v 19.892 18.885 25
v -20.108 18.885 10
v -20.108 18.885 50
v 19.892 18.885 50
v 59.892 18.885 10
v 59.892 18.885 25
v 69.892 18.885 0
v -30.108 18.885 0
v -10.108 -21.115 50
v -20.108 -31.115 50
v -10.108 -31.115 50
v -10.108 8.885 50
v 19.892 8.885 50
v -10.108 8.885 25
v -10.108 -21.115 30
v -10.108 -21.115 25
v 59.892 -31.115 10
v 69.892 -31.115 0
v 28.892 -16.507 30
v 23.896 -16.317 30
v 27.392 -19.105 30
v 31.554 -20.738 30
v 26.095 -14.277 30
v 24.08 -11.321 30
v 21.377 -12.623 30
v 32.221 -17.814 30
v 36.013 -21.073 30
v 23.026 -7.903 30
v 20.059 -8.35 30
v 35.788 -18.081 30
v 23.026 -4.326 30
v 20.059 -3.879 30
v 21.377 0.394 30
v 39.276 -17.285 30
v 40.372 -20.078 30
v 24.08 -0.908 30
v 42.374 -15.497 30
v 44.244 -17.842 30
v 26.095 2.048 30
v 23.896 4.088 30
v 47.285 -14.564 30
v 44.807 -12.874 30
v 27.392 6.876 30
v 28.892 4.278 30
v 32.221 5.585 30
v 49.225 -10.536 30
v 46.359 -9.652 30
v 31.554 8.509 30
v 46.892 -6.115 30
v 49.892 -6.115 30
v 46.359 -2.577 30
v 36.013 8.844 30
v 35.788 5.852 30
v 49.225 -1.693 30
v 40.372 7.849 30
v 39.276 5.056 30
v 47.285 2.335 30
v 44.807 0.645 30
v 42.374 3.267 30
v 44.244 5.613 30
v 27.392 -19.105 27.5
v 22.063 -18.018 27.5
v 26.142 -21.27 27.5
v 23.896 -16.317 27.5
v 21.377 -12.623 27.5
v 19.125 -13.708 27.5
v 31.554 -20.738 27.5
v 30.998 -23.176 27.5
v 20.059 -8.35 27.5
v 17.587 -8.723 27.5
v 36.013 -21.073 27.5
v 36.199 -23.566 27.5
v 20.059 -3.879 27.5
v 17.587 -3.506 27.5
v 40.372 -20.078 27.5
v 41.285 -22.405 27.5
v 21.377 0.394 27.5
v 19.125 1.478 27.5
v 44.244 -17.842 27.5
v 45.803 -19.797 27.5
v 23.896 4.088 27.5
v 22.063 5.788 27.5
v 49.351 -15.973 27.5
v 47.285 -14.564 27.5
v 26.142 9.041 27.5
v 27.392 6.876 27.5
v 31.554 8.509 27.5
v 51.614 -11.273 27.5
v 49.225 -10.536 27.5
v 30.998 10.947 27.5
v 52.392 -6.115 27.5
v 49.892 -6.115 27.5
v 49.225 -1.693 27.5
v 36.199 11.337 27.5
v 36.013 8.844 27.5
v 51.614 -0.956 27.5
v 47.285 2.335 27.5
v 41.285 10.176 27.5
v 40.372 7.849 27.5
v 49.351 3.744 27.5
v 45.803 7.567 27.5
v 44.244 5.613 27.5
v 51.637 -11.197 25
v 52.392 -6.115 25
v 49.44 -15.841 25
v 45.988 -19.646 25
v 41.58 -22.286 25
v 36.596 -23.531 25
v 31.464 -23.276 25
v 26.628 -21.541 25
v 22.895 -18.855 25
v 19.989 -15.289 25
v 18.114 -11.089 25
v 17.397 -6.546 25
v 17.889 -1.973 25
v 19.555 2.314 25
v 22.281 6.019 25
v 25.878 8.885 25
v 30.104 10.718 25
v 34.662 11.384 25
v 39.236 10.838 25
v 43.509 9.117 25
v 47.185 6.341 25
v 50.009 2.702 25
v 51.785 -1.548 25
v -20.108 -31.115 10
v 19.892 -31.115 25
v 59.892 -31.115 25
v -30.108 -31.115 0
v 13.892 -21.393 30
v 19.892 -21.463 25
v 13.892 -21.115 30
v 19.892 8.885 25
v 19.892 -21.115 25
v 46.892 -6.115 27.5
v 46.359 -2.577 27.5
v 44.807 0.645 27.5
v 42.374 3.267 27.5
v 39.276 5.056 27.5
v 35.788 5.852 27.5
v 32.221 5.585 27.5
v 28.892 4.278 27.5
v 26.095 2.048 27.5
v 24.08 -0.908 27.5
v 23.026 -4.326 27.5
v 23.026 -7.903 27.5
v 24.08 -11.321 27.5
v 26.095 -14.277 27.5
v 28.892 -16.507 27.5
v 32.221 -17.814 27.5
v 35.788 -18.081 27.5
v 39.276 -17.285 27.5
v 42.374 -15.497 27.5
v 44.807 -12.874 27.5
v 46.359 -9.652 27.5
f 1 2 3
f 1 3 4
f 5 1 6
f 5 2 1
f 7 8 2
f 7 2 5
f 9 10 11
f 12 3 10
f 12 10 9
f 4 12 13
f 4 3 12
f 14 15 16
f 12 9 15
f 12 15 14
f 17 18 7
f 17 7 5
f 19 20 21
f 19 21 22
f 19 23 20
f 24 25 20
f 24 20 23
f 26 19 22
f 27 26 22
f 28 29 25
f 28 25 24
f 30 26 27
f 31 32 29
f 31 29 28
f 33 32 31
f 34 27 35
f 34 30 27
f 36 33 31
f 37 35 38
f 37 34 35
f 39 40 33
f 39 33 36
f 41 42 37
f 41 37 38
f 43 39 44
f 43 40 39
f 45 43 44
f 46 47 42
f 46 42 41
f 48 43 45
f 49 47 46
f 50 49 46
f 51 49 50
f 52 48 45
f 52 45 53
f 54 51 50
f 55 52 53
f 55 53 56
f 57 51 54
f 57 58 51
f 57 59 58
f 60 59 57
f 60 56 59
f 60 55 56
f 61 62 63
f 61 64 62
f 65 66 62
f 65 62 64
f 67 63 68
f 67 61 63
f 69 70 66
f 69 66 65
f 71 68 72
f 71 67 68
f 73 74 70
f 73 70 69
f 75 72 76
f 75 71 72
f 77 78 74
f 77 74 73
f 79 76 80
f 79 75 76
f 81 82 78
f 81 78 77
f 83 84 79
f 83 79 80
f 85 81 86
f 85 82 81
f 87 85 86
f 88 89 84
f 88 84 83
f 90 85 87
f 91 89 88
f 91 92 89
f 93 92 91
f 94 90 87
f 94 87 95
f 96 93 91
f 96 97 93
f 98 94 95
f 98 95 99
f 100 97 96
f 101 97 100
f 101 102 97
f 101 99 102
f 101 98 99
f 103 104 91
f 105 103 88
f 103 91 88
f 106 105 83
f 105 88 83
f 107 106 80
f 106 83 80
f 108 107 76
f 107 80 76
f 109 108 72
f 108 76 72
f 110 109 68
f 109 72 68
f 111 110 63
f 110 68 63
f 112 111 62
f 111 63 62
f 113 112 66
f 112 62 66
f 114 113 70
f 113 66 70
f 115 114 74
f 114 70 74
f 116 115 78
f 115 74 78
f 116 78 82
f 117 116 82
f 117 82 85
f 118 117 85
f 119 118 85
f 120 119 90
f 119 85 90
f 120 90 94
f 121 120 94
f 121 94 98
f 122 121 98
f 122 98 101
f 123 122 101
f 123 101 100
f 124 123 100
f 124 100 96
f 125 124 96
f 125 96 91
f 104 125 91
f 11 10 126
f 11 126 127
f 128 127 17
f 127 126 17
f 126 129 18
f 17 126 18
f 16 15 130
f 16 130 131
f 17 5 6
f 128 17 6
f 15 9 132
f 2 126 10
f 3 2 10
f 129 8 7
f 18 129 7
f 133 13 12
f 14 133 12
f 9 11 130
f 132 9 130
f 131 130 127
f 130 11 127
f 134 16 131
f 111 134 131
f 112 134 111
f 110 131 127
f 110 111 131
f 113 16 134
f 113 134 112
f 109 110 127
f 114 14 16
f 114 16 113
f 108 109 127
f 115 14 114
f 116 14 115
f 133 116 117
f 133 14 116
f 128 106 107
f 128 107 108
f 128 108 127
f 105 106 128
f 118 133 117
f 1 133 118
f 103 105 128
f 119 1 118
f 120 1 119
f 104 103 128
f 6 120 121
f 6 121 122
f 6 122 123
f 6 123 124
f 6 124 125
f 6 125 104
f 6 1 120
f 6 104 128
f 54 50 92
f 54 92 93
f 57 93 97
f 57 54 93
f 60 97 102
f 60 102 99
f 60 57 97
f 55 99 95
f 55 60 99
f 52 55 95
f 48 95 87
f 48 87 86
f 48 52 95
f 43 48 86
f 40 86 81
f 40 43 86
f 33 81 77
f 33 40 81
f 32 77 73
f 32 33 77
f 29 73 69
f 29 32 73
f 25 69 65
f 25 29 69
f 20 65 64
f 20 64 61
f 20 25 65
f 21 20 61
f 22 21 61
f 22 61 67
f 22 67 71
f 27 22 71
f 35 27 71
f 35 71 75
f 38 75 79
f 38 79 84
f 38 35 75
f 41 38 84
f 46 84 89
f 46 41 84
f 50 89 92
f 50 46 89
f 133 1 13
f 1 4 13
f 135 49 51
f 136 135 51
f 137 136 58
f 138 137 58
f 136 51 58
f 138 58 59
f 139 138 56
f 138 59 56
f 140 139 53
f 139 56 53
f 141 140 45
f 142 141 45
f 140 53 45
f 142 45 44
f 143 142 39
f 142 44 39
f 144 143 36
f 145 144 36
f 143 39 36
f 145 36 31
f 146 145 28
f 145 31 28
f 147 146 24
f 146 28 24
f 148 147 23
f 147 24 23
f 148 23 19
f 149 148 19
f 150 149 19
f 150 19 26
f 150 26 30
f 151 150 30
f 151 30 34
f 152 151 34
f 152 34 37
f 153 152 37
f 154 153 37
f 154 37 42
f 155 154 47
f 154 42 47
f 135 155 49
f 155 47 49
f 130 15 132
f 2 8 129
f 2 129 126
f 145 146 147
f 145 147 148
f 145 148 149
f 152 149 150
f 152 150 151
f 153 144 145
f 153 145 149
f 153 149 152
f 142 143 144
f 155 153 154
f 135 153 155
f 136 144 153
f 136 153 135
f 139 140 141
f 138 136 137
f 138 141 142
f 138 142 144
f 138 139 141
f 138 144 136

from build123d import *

# Parameters (mm, degrees)
ESQUISSE2_W              = 100
ESQUISSE2_H              = 50
BOSS_EXTRU_1_DEPTH       = 50
ENL_V_MAT_EXTRU_2_DEPTH  = 51
ESQUISSE7_W              = 40
ESQUISSE7_H              = 50
ENL_V_MAT_EXTRU_3_DEPTH  = 20
ESQUISSE8_W              = 30
ESQUISSE8_H              = 30
ENL_V_MAT_EXTRU_4_DEPTH  = 20
ENL_V_MAT_EXTRU_7_DEPTH  = 2.5
ENL_V_MAT_EXTRU_10_DEPTH = 5
ENL_V_MAT_EXTRU_11_DEPTH = 5
ENL_V_MAT_EXTRU_12_DEPTH = 10
ESQUISSE16_R             = 17.5
ESQUISSE16_R_2           = 15
ENL_V_MAT_EXTRU_13_DEPTH = 2.5
ESQUISSE17_R             = 12
ENL_V_MAT_EXTRU_14_DEPTH = 2.5


with BuildPart() as part:
    # Esquisse2 → Boss.-Extru.1 (new body)
    with BuildSketch(Plane.XY):
        with Locations((19.891640867, -6.114551084)):
            Rectangle(ESQUISSE2_W, ESQUISSE2_H)
    extrude(amount=BOSS_EXTRU_1_DEPTH)

    # Esquisse5 → Enlèv. mat.-Extru.2 (cut, through all)
    with BuildSketch(Plane(origin=(0, -31.114551084, 0), x_dir=(-1, 0, 0), z_dir=(0, -1, 0))):
        Polygon((30.108359133, 0), (20.108359133, -10), (20.108359133, -50), (30.108359133, -50), align=None)
        Polygon((-69.891640867, 0), (-59.891640867, -10), (-59.891640867, -50), (-69.891640867, -50), align=None)
    extrude(amount=-ENL_V_MAT_EXTRU_2_DEPTH, mode=Mode.SUBTRACT)

    # Esquisse7 → Enlèv. mat.-Extru.3 (cut)
    with BuildSketch(Plane.XY.offset(50)):
        with Locations((39.891640867, -6.114551084)):
            Rectangle(ESQUISSE7_W, ESQUISSE7_H)
    extrude(amount=-ENL_V_MAT_EXTRU_3_DEPTH, mode=Mode.SUBTRACT)

    # Esquisse8 → Enlèv. mat.-Extru.4 (cut)
    with BuildSketch(Plane.XY.offset(50)):
        with Locations((4.891640867, -6.114551084)):
            Rectangle(ESQUISSE8_W, ESQUISSE8_H)
    extrude(amount=-ENL_V_MAT_EXTRU_4_DEPTH, mode=Mode.SUBTRACT)

    # Esquisse9 → Enlèv. mat.-Extru.7 (cut)
    with BuildSketch(Plane.XY.offset(30)):
        with BuildLine():
            Line((25.877762678, 8.885448916), (19.891640867, 8.885448916))
            Line((19.891640867, 8.885448916), (-10.108359133, 8.885448916))
            Line((-10.108359133, 8.885448916), (-10.108359133, -20.265562259))
            Line((-10.108359133, -20.265562259), (-10.108359133, -21.114551084))
            Line((-10.108359133, -21.114551084), (19.891640867, -21.114551084))
            Line((19.891640867, -21.114551084), (26.628394236, -21.540787019))
            ThreePointArc((26.628394236, -21.540787019), (17.396963997, -6.546154144), (25.877762678, 8.885448916))
        make_face()
    extrude(amount=-ENL_V_MAT_EXTRU_7_DEPTH, mode=Mode.SUBTRACT)

    # Esquisse11 → Enlèv. mat.-Extru.10 (cut)
    with BuildSketch(Plane.XY.offset(30)):
        with BuildLine():
            Line((26.628394236, -21.540787019), (19.891640867, -21.114551084))
            Line((19.891640867, -21.114551084), (19.891640867, -31.114551084))
            Line((19.891640867, -31.114551084), (59.891640867, -31.114551084))
            Line((59.891640867, -31.114551084), (59.891640867, 18.885448916))
            Line((59.891640867, 18.885448916), (19.891640867, 18.885448916))
            Line((19.891640867, 18.885448916), (19.891640867, 8.885448916))
            Line((19.891640867, 8.885448916), (25.877762678, 8.885448916))
            ThreePointArc((25.877762678, 8.885448916), (43.508691746, 9.116878073), (52.391640867, -6.114551084))
            ThreePointArc((52.391640867, -6.114551084), (43.881723847, -21.12882456), (26.628394236, -21.540787019))
        make_face()
    extrude(amount=-ENL_V_MAT_EXTRU_10_DEPTH, mode=Mode.SUBTRACT)

    # Esquisse13 → Enlèv. mat.-Extru.11 (cut)
    with BuildSketch(Plane.XY.offset(30)):
        with BuildLine():
            ThreePointArc((26.628394236, -21.540787019), (17.396963997, -6.546154144), (25.877762678, 8.885448916))
            Line((25.877762678, 8.885448916), (-10.108359133, 8.885448916))
            Line((-10.108359133, 8.885448916), (-10.108359133, -21.114551084))
            Line((-10.108359133, -21.114551084), (26.628394236, -21.540787019))
        make_face()
    extrude(amount=-ENL_V_MAT_EXTRU_11_DEPTH, mode=Mode.SUBTRACT)

    # Esquisse15 → Enlèv. mat.-Extru.12 (cut)
    with BuildSketch(Plane(origin=(0, -31.114551084, 0), x_dir=(-1, 0, 0), z_dir=(0, -1, 0))):
        Polygon((10.108359133, -50), (-19.891640867, -25), (-19.891640867, -50), align=None)
    extrude(amount=-ENL_V_MAT_EXTRU_12_DEPTH, mode=Mode.SUBTRACT)

    # Esquisse16 → Enlèv. mat.-Extru.13 (cut)
    with BuildSketch(Plane.XY.offset(30)):
        with Locations((34.891640867, -6.114551084)):
            Circle(ESQUISSE16_R)
        with Locations((34.891640867, -6.114551084)):
            Circle(ESQUISSE16_R_2, mode=Mode.SUBTRACT)
    extrude(amount=-ENL_V_MAT_EXTRU_13_DEPTH, mode=Mode.SUBTRACT)

    # Esquisse17 → Enlèv. mat.-Extru.14 (cut)
    with BuildSketch(Plane.XY.offset(30)):
        with Locations((34.891640867, -6.114551084)):
            Circle(ESQUISSE17_R)
    extrude(amount=-ENL_V_MAT_EXTRU_14_DEPTH, mode=Mode.SUBTRACT)


solid = part.part
